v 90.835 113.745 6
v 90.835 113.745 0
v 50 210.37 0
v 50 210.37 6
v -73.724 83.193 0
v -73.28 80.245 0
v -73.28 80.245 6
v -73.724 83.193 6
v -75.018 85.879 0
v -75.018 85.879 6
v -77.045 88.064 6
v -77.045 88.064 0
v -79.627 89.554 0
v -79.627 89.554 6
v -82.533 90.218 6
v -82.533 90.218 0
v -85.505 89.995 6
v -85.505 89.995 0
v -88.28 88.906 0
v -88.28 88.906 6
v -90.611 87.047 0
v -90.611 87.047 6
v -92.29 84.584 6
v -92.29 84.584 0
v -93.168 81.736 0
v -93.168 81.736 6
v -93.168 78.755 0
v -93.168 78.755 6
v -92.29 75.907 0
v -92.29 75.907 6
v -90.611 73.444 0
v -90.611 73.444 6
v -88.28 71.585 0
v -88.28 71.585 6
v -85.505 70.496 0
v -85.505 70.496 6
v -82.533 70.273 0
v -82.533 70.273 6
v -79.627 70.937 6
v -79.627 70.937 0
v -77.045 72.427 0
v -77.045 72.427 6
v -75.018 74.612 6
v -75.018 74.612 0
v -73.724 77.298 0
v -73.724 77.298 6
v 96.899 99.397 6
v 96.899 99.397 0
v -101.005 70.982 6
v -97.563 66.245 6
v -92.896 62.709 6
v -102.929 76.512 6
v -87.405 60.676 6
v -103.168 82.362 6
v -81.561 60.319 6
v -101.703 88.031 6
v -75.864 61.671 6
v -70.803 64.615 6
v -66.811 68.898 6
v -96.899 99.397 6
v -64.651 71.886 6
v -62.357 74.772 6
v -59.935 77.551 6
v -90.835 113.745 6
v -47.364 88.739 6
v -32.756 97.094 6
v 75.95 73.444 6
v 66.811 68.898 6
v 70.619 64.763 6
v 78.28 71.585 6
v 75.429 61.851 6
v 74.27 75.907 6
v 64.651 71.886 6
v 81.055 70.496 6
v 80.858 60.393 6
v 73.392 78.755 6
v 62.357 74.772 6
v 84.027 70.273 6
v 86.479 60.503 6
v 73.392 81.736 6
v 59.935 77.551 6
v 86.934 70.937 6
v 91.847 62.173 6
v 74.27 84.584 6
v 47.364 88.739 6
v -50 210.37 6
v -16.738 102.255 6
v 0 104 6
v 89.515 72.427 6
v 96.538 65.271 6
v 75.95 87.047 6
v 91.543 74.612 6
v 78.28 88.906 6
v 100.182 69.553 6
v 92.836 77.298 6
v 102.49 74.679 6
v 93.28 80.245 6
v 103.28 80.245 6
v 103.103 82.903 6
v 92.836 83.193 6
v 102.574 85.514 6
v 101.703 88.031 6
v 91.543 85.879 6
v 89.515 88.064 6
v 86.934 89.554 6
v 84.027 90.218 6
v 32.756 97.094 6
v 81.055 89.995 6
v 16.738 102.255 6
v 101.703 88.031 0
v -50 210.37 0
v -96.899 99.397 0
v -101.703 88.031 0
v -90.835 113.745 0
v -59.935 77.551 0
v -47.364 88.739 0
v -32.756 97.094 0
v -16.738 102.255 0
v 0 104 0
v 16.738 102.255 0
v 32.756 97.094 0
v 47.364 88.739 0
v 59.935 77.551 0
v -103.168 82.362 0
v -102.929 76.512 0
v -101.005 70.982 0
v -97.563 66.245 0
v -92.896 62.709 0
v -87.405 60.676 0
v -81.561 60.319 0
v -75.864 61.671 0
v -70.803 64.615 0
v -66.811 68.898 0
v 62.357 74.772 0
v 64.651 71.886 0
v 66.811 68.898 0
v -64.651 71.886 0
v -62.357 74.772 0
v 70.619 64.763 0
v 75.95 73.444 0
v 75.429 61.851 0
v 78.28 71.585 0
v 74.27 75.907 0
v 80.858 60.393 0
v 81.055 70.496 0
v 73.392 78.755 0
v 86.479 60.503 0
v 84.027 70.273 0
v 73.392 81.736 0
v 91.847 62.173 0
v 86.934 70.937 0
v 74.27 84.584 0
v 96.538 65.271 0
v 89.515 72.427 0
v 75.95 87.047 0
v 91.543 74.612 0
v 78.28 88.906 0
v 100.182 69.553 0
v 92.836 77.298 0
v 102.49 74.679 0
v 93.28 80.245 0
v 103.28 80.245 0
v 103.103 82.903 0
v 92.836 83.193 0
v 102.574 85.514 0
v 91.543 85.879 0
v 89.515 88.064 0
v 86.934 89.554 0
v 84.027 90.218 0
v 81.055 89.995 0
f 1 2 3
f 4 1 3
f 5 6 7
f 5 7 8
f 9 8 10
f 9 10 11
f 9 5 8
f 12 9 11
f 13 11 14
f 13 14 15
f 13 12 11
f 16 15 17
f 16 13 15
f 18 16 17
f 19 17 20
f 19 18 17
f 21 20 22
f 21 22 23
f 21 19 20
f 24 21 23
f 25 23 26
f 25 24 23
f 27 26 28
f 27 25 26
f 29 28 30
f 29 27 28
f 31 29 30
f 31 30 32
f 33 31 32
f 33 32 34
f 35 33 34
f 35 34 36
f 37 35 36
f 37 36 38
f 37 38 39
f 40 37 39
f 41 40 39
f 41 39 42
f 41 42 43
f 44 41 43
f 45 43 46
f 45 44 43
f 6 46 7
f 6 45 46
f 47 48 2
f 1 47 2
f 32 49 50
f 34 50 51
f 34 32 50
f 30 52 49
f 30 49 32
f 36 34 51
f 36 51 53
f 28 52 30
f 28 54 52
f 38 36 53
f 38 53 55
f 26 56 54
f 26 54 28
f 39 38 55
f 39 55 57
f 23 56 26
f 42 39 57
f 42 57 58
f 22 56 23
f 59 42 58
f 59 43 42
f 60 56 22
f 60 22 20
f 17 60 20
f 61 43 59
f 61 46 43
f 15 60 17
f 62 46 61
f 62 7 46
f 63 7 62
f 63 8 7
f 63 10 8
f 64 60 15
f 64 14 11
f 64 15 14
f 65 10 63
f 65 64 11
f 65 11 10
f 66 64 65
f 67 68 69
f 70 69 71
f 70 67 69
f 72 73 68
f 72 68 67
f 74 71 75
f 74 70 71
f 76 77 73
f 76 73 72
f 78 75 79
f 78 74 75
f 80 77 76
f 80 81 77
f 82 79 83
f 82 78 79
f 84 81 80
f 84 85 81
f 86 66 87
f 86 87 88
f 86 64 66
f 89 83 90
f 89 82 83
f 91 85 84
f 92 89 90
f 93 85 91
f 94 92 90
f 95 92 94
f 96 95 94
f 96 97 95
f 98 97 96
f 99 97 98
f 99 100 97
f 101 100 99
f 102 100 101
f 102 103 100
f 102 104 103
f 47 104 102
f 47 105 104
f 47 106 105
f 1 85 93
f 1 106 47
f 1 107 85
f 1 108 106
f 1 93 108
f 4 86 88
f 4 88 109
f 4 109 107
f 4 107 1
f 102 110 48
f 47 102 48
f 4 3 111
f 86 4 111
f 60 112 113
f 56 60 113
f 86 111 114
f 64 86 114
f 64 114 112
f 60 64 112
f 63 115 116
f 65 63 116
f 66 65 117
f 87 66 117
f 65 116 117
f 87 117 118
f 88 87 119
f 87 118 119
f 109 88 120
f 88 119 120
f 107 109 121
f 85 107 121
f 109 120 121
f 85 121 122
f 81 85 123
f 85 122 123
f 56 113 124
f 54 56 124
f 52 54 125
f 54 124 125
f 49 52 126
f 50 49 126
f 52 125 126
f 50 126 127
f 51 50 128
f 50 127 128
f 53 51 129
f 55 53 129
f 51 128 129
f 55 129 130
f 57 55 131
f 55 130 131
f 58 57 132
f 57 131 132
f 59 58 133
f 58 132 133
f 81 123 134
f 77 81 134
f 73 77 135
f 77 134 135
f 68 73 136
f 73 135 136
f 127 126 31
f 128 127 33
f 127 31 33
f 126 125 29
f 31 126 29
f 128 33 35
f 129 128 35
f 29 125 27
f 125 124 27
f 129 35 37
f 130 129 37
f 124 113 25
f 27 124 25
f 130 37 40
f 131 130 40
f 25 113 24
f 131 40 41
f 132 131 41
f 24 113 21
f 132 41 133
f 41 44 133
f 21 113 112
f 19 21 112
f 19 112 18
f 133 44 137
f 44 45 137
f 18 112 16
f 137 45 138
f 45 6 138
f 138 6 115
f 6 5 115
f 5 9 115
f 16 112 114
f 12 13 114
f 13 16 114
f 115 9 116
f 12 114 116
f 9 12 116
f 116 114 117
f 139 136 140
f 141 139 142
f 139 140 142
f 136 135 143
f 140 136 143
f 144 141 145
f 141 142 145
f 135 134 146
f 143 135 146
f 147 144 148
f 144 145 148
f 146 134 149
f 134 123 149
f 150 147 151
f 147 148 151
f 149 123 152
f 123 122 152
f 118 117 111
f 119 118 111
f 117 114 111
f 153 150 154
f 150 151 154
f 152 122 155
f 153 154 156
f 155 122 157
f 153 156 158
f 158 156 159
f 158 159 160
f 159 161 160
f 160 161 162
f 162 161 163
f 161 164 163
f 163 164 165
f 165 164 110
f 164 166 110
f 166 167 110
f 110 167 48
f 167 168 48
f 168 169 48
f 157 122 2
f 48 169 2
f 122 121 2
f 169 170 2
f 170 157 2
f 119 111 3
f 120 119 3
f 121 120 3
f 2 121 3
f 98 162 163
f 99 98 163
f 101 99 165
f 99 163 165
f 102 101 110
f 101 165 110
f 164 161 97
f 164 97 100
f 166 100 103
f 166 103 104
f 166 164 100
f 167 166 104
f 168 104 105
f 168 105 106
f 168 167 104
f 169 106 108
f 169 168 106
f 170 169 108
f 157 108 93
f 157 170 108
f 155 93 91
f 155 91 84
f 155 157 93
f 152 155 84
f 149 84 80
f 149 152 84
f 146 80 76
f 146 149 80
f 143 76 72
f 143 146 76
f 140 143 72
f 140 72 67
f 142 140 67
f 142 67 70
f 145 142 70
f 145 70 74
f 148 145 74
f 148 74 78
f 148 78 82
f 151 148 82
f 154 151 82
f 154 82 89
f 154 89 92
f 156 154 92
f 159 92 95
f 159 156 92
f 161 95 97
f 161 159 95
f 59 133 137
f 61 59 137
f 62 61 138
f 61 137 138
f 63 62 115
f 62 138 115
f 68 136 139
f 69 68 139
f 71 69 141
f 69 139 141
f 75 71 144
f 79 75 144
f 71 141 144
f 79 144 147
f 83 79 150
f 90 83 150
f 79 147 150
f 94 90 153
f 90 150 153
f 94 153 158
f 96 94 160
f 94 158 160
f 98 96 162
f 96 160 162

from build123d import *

# Parameters (mm, degrees)
F0_R     = 10
F1_DEPTH = 6


with BuildPart() as f1:
    # F0 (on Top) → F1 (new body)
    with BuildSketch(Plane.XY):
        with BuildLine():
            ThreePointArc((66.8107155763, 68.8983527146), (89.2220086446, 61.1485010982), (103.2801650714, 80.2454771665))
            ThreePointArc((103.2801650714, 80.2454771665), (102.8817929615, 84.2174016446), (101.7025466654, 88.0310957293))
            ThreePointArc((101.7025466654, 88.0310957293), (73.6640874011, 97.7820404055), (66.8107155763, 68.8983527146))
        make_face()
        with Locations((83.2801650714, 80.2454771665)):
            Circle(F0_R, mode=Mode.SUBTRACT)
        with BuildLine():
            ThreePointArc((66.8107155763, 68.8983527146), (73.6640874011, 97.7820404055), (101.7025466654, 88.0310957293))
            Line((101.7025466654, 88.0310957293), (96.8992238213, 99.3967496769))
            ThreePointArc((96.8992238213, 99.3967496769), (71.3236564608, 100.476441104), (59.9351524158, 77.550967172))
            ThreePointArc((59.9351524158, 77.550967172), (63.5204352748, 73.3418677958), (66.8107155763, 68.8983527146))
        make_face()
        with BuildLine():
            ThreePointArc((59.9351524158, 77.550967172), (71.3236564608, 100.476441104), (96.8992238213, 99.3967496769))
            Line((96.8992238213, 99.3967496769), (90.8352022654, 113.7454771665))
            Line((90.8352022654, 113.7454771665), (-90.8352022654, 113.7454771665))
            Line((-90.8352022654, 113.7454771665), (-96.8992238213, 99.3967496769))
            ThreePointArc((-96.8992238213, 99.3967496769), (-72.5051449003, 101.1296563534), (-59.7801650714, 80.2454771665))
            ThreePointArc((-59.7801650714, 80.2454771665), (-59.8189439032, 78.8959953041), (-59.9351524158, 77.550967172))
            ThreePointArc((-59.9351524158, 77.550967172), (0, 104), (59.9351524158, 77.550967172))
        make_face()
        with BuildLine():
            ThreePointArc((-66.8107155763, 68.8983527146), (-63.5204352748, 73.3418677958), (-59.9351524158, 77.550967172))
            ThreePointArc((-59.9351524158, 77.550967172), (-59.8189439032, 78.8959953041), (-59.7801650714, 80.2454771665))
            ThreePointArc((-59.7801650714, 80.2454771665), (-72.5051449003, 101.1296563534), (-96.8992238213, 99.3967496769))
            Line((-96.8992238213, 99.3967496769), (-101.7025466654, 88.0310957293))
            ThreePointArc((-101.7025466654, 88.0310957293), (-79.3082405933, 99.8471050565), (-63.2801650714, 80.2454771665))
            ThreePointArc((-63.2801650714, 80.2454771665), (-64.1831890032, 74.3036335933), (-66.8107155763, 68.8983527146))
        make_face()
        with BuildLine():
            ThreePointArc((-101.7025466654, 88.0310957293), (-92.8962427418, 62.7089139274), (-66.8107155763, 68.8983527146))
            ThreePointArc((-66.8107155763, 68.8983527146), (-64.1831890032, 74.3036335933), (-63.2801650714, 80.2454771665))
            ThreePointArc((-63.2801650714, 80.2454771665), (-79.3082405933, 99.8471050565), (-101.7025466654, 88.0310957293))
        make_face()
        with Locations((-83.2801650714, 80.2454771665)):
            Circle(F0_R, mode=Mode.SUBTRACT)
        Polygon((-90.8352022654, 113.7454771665), (90.8352022654, 113.7454771665), (50, 210.37), (0, 210.37), (-50, 210.37), align=None)
    extrude(amount=F1_DEPTH)


solid = f1.part
